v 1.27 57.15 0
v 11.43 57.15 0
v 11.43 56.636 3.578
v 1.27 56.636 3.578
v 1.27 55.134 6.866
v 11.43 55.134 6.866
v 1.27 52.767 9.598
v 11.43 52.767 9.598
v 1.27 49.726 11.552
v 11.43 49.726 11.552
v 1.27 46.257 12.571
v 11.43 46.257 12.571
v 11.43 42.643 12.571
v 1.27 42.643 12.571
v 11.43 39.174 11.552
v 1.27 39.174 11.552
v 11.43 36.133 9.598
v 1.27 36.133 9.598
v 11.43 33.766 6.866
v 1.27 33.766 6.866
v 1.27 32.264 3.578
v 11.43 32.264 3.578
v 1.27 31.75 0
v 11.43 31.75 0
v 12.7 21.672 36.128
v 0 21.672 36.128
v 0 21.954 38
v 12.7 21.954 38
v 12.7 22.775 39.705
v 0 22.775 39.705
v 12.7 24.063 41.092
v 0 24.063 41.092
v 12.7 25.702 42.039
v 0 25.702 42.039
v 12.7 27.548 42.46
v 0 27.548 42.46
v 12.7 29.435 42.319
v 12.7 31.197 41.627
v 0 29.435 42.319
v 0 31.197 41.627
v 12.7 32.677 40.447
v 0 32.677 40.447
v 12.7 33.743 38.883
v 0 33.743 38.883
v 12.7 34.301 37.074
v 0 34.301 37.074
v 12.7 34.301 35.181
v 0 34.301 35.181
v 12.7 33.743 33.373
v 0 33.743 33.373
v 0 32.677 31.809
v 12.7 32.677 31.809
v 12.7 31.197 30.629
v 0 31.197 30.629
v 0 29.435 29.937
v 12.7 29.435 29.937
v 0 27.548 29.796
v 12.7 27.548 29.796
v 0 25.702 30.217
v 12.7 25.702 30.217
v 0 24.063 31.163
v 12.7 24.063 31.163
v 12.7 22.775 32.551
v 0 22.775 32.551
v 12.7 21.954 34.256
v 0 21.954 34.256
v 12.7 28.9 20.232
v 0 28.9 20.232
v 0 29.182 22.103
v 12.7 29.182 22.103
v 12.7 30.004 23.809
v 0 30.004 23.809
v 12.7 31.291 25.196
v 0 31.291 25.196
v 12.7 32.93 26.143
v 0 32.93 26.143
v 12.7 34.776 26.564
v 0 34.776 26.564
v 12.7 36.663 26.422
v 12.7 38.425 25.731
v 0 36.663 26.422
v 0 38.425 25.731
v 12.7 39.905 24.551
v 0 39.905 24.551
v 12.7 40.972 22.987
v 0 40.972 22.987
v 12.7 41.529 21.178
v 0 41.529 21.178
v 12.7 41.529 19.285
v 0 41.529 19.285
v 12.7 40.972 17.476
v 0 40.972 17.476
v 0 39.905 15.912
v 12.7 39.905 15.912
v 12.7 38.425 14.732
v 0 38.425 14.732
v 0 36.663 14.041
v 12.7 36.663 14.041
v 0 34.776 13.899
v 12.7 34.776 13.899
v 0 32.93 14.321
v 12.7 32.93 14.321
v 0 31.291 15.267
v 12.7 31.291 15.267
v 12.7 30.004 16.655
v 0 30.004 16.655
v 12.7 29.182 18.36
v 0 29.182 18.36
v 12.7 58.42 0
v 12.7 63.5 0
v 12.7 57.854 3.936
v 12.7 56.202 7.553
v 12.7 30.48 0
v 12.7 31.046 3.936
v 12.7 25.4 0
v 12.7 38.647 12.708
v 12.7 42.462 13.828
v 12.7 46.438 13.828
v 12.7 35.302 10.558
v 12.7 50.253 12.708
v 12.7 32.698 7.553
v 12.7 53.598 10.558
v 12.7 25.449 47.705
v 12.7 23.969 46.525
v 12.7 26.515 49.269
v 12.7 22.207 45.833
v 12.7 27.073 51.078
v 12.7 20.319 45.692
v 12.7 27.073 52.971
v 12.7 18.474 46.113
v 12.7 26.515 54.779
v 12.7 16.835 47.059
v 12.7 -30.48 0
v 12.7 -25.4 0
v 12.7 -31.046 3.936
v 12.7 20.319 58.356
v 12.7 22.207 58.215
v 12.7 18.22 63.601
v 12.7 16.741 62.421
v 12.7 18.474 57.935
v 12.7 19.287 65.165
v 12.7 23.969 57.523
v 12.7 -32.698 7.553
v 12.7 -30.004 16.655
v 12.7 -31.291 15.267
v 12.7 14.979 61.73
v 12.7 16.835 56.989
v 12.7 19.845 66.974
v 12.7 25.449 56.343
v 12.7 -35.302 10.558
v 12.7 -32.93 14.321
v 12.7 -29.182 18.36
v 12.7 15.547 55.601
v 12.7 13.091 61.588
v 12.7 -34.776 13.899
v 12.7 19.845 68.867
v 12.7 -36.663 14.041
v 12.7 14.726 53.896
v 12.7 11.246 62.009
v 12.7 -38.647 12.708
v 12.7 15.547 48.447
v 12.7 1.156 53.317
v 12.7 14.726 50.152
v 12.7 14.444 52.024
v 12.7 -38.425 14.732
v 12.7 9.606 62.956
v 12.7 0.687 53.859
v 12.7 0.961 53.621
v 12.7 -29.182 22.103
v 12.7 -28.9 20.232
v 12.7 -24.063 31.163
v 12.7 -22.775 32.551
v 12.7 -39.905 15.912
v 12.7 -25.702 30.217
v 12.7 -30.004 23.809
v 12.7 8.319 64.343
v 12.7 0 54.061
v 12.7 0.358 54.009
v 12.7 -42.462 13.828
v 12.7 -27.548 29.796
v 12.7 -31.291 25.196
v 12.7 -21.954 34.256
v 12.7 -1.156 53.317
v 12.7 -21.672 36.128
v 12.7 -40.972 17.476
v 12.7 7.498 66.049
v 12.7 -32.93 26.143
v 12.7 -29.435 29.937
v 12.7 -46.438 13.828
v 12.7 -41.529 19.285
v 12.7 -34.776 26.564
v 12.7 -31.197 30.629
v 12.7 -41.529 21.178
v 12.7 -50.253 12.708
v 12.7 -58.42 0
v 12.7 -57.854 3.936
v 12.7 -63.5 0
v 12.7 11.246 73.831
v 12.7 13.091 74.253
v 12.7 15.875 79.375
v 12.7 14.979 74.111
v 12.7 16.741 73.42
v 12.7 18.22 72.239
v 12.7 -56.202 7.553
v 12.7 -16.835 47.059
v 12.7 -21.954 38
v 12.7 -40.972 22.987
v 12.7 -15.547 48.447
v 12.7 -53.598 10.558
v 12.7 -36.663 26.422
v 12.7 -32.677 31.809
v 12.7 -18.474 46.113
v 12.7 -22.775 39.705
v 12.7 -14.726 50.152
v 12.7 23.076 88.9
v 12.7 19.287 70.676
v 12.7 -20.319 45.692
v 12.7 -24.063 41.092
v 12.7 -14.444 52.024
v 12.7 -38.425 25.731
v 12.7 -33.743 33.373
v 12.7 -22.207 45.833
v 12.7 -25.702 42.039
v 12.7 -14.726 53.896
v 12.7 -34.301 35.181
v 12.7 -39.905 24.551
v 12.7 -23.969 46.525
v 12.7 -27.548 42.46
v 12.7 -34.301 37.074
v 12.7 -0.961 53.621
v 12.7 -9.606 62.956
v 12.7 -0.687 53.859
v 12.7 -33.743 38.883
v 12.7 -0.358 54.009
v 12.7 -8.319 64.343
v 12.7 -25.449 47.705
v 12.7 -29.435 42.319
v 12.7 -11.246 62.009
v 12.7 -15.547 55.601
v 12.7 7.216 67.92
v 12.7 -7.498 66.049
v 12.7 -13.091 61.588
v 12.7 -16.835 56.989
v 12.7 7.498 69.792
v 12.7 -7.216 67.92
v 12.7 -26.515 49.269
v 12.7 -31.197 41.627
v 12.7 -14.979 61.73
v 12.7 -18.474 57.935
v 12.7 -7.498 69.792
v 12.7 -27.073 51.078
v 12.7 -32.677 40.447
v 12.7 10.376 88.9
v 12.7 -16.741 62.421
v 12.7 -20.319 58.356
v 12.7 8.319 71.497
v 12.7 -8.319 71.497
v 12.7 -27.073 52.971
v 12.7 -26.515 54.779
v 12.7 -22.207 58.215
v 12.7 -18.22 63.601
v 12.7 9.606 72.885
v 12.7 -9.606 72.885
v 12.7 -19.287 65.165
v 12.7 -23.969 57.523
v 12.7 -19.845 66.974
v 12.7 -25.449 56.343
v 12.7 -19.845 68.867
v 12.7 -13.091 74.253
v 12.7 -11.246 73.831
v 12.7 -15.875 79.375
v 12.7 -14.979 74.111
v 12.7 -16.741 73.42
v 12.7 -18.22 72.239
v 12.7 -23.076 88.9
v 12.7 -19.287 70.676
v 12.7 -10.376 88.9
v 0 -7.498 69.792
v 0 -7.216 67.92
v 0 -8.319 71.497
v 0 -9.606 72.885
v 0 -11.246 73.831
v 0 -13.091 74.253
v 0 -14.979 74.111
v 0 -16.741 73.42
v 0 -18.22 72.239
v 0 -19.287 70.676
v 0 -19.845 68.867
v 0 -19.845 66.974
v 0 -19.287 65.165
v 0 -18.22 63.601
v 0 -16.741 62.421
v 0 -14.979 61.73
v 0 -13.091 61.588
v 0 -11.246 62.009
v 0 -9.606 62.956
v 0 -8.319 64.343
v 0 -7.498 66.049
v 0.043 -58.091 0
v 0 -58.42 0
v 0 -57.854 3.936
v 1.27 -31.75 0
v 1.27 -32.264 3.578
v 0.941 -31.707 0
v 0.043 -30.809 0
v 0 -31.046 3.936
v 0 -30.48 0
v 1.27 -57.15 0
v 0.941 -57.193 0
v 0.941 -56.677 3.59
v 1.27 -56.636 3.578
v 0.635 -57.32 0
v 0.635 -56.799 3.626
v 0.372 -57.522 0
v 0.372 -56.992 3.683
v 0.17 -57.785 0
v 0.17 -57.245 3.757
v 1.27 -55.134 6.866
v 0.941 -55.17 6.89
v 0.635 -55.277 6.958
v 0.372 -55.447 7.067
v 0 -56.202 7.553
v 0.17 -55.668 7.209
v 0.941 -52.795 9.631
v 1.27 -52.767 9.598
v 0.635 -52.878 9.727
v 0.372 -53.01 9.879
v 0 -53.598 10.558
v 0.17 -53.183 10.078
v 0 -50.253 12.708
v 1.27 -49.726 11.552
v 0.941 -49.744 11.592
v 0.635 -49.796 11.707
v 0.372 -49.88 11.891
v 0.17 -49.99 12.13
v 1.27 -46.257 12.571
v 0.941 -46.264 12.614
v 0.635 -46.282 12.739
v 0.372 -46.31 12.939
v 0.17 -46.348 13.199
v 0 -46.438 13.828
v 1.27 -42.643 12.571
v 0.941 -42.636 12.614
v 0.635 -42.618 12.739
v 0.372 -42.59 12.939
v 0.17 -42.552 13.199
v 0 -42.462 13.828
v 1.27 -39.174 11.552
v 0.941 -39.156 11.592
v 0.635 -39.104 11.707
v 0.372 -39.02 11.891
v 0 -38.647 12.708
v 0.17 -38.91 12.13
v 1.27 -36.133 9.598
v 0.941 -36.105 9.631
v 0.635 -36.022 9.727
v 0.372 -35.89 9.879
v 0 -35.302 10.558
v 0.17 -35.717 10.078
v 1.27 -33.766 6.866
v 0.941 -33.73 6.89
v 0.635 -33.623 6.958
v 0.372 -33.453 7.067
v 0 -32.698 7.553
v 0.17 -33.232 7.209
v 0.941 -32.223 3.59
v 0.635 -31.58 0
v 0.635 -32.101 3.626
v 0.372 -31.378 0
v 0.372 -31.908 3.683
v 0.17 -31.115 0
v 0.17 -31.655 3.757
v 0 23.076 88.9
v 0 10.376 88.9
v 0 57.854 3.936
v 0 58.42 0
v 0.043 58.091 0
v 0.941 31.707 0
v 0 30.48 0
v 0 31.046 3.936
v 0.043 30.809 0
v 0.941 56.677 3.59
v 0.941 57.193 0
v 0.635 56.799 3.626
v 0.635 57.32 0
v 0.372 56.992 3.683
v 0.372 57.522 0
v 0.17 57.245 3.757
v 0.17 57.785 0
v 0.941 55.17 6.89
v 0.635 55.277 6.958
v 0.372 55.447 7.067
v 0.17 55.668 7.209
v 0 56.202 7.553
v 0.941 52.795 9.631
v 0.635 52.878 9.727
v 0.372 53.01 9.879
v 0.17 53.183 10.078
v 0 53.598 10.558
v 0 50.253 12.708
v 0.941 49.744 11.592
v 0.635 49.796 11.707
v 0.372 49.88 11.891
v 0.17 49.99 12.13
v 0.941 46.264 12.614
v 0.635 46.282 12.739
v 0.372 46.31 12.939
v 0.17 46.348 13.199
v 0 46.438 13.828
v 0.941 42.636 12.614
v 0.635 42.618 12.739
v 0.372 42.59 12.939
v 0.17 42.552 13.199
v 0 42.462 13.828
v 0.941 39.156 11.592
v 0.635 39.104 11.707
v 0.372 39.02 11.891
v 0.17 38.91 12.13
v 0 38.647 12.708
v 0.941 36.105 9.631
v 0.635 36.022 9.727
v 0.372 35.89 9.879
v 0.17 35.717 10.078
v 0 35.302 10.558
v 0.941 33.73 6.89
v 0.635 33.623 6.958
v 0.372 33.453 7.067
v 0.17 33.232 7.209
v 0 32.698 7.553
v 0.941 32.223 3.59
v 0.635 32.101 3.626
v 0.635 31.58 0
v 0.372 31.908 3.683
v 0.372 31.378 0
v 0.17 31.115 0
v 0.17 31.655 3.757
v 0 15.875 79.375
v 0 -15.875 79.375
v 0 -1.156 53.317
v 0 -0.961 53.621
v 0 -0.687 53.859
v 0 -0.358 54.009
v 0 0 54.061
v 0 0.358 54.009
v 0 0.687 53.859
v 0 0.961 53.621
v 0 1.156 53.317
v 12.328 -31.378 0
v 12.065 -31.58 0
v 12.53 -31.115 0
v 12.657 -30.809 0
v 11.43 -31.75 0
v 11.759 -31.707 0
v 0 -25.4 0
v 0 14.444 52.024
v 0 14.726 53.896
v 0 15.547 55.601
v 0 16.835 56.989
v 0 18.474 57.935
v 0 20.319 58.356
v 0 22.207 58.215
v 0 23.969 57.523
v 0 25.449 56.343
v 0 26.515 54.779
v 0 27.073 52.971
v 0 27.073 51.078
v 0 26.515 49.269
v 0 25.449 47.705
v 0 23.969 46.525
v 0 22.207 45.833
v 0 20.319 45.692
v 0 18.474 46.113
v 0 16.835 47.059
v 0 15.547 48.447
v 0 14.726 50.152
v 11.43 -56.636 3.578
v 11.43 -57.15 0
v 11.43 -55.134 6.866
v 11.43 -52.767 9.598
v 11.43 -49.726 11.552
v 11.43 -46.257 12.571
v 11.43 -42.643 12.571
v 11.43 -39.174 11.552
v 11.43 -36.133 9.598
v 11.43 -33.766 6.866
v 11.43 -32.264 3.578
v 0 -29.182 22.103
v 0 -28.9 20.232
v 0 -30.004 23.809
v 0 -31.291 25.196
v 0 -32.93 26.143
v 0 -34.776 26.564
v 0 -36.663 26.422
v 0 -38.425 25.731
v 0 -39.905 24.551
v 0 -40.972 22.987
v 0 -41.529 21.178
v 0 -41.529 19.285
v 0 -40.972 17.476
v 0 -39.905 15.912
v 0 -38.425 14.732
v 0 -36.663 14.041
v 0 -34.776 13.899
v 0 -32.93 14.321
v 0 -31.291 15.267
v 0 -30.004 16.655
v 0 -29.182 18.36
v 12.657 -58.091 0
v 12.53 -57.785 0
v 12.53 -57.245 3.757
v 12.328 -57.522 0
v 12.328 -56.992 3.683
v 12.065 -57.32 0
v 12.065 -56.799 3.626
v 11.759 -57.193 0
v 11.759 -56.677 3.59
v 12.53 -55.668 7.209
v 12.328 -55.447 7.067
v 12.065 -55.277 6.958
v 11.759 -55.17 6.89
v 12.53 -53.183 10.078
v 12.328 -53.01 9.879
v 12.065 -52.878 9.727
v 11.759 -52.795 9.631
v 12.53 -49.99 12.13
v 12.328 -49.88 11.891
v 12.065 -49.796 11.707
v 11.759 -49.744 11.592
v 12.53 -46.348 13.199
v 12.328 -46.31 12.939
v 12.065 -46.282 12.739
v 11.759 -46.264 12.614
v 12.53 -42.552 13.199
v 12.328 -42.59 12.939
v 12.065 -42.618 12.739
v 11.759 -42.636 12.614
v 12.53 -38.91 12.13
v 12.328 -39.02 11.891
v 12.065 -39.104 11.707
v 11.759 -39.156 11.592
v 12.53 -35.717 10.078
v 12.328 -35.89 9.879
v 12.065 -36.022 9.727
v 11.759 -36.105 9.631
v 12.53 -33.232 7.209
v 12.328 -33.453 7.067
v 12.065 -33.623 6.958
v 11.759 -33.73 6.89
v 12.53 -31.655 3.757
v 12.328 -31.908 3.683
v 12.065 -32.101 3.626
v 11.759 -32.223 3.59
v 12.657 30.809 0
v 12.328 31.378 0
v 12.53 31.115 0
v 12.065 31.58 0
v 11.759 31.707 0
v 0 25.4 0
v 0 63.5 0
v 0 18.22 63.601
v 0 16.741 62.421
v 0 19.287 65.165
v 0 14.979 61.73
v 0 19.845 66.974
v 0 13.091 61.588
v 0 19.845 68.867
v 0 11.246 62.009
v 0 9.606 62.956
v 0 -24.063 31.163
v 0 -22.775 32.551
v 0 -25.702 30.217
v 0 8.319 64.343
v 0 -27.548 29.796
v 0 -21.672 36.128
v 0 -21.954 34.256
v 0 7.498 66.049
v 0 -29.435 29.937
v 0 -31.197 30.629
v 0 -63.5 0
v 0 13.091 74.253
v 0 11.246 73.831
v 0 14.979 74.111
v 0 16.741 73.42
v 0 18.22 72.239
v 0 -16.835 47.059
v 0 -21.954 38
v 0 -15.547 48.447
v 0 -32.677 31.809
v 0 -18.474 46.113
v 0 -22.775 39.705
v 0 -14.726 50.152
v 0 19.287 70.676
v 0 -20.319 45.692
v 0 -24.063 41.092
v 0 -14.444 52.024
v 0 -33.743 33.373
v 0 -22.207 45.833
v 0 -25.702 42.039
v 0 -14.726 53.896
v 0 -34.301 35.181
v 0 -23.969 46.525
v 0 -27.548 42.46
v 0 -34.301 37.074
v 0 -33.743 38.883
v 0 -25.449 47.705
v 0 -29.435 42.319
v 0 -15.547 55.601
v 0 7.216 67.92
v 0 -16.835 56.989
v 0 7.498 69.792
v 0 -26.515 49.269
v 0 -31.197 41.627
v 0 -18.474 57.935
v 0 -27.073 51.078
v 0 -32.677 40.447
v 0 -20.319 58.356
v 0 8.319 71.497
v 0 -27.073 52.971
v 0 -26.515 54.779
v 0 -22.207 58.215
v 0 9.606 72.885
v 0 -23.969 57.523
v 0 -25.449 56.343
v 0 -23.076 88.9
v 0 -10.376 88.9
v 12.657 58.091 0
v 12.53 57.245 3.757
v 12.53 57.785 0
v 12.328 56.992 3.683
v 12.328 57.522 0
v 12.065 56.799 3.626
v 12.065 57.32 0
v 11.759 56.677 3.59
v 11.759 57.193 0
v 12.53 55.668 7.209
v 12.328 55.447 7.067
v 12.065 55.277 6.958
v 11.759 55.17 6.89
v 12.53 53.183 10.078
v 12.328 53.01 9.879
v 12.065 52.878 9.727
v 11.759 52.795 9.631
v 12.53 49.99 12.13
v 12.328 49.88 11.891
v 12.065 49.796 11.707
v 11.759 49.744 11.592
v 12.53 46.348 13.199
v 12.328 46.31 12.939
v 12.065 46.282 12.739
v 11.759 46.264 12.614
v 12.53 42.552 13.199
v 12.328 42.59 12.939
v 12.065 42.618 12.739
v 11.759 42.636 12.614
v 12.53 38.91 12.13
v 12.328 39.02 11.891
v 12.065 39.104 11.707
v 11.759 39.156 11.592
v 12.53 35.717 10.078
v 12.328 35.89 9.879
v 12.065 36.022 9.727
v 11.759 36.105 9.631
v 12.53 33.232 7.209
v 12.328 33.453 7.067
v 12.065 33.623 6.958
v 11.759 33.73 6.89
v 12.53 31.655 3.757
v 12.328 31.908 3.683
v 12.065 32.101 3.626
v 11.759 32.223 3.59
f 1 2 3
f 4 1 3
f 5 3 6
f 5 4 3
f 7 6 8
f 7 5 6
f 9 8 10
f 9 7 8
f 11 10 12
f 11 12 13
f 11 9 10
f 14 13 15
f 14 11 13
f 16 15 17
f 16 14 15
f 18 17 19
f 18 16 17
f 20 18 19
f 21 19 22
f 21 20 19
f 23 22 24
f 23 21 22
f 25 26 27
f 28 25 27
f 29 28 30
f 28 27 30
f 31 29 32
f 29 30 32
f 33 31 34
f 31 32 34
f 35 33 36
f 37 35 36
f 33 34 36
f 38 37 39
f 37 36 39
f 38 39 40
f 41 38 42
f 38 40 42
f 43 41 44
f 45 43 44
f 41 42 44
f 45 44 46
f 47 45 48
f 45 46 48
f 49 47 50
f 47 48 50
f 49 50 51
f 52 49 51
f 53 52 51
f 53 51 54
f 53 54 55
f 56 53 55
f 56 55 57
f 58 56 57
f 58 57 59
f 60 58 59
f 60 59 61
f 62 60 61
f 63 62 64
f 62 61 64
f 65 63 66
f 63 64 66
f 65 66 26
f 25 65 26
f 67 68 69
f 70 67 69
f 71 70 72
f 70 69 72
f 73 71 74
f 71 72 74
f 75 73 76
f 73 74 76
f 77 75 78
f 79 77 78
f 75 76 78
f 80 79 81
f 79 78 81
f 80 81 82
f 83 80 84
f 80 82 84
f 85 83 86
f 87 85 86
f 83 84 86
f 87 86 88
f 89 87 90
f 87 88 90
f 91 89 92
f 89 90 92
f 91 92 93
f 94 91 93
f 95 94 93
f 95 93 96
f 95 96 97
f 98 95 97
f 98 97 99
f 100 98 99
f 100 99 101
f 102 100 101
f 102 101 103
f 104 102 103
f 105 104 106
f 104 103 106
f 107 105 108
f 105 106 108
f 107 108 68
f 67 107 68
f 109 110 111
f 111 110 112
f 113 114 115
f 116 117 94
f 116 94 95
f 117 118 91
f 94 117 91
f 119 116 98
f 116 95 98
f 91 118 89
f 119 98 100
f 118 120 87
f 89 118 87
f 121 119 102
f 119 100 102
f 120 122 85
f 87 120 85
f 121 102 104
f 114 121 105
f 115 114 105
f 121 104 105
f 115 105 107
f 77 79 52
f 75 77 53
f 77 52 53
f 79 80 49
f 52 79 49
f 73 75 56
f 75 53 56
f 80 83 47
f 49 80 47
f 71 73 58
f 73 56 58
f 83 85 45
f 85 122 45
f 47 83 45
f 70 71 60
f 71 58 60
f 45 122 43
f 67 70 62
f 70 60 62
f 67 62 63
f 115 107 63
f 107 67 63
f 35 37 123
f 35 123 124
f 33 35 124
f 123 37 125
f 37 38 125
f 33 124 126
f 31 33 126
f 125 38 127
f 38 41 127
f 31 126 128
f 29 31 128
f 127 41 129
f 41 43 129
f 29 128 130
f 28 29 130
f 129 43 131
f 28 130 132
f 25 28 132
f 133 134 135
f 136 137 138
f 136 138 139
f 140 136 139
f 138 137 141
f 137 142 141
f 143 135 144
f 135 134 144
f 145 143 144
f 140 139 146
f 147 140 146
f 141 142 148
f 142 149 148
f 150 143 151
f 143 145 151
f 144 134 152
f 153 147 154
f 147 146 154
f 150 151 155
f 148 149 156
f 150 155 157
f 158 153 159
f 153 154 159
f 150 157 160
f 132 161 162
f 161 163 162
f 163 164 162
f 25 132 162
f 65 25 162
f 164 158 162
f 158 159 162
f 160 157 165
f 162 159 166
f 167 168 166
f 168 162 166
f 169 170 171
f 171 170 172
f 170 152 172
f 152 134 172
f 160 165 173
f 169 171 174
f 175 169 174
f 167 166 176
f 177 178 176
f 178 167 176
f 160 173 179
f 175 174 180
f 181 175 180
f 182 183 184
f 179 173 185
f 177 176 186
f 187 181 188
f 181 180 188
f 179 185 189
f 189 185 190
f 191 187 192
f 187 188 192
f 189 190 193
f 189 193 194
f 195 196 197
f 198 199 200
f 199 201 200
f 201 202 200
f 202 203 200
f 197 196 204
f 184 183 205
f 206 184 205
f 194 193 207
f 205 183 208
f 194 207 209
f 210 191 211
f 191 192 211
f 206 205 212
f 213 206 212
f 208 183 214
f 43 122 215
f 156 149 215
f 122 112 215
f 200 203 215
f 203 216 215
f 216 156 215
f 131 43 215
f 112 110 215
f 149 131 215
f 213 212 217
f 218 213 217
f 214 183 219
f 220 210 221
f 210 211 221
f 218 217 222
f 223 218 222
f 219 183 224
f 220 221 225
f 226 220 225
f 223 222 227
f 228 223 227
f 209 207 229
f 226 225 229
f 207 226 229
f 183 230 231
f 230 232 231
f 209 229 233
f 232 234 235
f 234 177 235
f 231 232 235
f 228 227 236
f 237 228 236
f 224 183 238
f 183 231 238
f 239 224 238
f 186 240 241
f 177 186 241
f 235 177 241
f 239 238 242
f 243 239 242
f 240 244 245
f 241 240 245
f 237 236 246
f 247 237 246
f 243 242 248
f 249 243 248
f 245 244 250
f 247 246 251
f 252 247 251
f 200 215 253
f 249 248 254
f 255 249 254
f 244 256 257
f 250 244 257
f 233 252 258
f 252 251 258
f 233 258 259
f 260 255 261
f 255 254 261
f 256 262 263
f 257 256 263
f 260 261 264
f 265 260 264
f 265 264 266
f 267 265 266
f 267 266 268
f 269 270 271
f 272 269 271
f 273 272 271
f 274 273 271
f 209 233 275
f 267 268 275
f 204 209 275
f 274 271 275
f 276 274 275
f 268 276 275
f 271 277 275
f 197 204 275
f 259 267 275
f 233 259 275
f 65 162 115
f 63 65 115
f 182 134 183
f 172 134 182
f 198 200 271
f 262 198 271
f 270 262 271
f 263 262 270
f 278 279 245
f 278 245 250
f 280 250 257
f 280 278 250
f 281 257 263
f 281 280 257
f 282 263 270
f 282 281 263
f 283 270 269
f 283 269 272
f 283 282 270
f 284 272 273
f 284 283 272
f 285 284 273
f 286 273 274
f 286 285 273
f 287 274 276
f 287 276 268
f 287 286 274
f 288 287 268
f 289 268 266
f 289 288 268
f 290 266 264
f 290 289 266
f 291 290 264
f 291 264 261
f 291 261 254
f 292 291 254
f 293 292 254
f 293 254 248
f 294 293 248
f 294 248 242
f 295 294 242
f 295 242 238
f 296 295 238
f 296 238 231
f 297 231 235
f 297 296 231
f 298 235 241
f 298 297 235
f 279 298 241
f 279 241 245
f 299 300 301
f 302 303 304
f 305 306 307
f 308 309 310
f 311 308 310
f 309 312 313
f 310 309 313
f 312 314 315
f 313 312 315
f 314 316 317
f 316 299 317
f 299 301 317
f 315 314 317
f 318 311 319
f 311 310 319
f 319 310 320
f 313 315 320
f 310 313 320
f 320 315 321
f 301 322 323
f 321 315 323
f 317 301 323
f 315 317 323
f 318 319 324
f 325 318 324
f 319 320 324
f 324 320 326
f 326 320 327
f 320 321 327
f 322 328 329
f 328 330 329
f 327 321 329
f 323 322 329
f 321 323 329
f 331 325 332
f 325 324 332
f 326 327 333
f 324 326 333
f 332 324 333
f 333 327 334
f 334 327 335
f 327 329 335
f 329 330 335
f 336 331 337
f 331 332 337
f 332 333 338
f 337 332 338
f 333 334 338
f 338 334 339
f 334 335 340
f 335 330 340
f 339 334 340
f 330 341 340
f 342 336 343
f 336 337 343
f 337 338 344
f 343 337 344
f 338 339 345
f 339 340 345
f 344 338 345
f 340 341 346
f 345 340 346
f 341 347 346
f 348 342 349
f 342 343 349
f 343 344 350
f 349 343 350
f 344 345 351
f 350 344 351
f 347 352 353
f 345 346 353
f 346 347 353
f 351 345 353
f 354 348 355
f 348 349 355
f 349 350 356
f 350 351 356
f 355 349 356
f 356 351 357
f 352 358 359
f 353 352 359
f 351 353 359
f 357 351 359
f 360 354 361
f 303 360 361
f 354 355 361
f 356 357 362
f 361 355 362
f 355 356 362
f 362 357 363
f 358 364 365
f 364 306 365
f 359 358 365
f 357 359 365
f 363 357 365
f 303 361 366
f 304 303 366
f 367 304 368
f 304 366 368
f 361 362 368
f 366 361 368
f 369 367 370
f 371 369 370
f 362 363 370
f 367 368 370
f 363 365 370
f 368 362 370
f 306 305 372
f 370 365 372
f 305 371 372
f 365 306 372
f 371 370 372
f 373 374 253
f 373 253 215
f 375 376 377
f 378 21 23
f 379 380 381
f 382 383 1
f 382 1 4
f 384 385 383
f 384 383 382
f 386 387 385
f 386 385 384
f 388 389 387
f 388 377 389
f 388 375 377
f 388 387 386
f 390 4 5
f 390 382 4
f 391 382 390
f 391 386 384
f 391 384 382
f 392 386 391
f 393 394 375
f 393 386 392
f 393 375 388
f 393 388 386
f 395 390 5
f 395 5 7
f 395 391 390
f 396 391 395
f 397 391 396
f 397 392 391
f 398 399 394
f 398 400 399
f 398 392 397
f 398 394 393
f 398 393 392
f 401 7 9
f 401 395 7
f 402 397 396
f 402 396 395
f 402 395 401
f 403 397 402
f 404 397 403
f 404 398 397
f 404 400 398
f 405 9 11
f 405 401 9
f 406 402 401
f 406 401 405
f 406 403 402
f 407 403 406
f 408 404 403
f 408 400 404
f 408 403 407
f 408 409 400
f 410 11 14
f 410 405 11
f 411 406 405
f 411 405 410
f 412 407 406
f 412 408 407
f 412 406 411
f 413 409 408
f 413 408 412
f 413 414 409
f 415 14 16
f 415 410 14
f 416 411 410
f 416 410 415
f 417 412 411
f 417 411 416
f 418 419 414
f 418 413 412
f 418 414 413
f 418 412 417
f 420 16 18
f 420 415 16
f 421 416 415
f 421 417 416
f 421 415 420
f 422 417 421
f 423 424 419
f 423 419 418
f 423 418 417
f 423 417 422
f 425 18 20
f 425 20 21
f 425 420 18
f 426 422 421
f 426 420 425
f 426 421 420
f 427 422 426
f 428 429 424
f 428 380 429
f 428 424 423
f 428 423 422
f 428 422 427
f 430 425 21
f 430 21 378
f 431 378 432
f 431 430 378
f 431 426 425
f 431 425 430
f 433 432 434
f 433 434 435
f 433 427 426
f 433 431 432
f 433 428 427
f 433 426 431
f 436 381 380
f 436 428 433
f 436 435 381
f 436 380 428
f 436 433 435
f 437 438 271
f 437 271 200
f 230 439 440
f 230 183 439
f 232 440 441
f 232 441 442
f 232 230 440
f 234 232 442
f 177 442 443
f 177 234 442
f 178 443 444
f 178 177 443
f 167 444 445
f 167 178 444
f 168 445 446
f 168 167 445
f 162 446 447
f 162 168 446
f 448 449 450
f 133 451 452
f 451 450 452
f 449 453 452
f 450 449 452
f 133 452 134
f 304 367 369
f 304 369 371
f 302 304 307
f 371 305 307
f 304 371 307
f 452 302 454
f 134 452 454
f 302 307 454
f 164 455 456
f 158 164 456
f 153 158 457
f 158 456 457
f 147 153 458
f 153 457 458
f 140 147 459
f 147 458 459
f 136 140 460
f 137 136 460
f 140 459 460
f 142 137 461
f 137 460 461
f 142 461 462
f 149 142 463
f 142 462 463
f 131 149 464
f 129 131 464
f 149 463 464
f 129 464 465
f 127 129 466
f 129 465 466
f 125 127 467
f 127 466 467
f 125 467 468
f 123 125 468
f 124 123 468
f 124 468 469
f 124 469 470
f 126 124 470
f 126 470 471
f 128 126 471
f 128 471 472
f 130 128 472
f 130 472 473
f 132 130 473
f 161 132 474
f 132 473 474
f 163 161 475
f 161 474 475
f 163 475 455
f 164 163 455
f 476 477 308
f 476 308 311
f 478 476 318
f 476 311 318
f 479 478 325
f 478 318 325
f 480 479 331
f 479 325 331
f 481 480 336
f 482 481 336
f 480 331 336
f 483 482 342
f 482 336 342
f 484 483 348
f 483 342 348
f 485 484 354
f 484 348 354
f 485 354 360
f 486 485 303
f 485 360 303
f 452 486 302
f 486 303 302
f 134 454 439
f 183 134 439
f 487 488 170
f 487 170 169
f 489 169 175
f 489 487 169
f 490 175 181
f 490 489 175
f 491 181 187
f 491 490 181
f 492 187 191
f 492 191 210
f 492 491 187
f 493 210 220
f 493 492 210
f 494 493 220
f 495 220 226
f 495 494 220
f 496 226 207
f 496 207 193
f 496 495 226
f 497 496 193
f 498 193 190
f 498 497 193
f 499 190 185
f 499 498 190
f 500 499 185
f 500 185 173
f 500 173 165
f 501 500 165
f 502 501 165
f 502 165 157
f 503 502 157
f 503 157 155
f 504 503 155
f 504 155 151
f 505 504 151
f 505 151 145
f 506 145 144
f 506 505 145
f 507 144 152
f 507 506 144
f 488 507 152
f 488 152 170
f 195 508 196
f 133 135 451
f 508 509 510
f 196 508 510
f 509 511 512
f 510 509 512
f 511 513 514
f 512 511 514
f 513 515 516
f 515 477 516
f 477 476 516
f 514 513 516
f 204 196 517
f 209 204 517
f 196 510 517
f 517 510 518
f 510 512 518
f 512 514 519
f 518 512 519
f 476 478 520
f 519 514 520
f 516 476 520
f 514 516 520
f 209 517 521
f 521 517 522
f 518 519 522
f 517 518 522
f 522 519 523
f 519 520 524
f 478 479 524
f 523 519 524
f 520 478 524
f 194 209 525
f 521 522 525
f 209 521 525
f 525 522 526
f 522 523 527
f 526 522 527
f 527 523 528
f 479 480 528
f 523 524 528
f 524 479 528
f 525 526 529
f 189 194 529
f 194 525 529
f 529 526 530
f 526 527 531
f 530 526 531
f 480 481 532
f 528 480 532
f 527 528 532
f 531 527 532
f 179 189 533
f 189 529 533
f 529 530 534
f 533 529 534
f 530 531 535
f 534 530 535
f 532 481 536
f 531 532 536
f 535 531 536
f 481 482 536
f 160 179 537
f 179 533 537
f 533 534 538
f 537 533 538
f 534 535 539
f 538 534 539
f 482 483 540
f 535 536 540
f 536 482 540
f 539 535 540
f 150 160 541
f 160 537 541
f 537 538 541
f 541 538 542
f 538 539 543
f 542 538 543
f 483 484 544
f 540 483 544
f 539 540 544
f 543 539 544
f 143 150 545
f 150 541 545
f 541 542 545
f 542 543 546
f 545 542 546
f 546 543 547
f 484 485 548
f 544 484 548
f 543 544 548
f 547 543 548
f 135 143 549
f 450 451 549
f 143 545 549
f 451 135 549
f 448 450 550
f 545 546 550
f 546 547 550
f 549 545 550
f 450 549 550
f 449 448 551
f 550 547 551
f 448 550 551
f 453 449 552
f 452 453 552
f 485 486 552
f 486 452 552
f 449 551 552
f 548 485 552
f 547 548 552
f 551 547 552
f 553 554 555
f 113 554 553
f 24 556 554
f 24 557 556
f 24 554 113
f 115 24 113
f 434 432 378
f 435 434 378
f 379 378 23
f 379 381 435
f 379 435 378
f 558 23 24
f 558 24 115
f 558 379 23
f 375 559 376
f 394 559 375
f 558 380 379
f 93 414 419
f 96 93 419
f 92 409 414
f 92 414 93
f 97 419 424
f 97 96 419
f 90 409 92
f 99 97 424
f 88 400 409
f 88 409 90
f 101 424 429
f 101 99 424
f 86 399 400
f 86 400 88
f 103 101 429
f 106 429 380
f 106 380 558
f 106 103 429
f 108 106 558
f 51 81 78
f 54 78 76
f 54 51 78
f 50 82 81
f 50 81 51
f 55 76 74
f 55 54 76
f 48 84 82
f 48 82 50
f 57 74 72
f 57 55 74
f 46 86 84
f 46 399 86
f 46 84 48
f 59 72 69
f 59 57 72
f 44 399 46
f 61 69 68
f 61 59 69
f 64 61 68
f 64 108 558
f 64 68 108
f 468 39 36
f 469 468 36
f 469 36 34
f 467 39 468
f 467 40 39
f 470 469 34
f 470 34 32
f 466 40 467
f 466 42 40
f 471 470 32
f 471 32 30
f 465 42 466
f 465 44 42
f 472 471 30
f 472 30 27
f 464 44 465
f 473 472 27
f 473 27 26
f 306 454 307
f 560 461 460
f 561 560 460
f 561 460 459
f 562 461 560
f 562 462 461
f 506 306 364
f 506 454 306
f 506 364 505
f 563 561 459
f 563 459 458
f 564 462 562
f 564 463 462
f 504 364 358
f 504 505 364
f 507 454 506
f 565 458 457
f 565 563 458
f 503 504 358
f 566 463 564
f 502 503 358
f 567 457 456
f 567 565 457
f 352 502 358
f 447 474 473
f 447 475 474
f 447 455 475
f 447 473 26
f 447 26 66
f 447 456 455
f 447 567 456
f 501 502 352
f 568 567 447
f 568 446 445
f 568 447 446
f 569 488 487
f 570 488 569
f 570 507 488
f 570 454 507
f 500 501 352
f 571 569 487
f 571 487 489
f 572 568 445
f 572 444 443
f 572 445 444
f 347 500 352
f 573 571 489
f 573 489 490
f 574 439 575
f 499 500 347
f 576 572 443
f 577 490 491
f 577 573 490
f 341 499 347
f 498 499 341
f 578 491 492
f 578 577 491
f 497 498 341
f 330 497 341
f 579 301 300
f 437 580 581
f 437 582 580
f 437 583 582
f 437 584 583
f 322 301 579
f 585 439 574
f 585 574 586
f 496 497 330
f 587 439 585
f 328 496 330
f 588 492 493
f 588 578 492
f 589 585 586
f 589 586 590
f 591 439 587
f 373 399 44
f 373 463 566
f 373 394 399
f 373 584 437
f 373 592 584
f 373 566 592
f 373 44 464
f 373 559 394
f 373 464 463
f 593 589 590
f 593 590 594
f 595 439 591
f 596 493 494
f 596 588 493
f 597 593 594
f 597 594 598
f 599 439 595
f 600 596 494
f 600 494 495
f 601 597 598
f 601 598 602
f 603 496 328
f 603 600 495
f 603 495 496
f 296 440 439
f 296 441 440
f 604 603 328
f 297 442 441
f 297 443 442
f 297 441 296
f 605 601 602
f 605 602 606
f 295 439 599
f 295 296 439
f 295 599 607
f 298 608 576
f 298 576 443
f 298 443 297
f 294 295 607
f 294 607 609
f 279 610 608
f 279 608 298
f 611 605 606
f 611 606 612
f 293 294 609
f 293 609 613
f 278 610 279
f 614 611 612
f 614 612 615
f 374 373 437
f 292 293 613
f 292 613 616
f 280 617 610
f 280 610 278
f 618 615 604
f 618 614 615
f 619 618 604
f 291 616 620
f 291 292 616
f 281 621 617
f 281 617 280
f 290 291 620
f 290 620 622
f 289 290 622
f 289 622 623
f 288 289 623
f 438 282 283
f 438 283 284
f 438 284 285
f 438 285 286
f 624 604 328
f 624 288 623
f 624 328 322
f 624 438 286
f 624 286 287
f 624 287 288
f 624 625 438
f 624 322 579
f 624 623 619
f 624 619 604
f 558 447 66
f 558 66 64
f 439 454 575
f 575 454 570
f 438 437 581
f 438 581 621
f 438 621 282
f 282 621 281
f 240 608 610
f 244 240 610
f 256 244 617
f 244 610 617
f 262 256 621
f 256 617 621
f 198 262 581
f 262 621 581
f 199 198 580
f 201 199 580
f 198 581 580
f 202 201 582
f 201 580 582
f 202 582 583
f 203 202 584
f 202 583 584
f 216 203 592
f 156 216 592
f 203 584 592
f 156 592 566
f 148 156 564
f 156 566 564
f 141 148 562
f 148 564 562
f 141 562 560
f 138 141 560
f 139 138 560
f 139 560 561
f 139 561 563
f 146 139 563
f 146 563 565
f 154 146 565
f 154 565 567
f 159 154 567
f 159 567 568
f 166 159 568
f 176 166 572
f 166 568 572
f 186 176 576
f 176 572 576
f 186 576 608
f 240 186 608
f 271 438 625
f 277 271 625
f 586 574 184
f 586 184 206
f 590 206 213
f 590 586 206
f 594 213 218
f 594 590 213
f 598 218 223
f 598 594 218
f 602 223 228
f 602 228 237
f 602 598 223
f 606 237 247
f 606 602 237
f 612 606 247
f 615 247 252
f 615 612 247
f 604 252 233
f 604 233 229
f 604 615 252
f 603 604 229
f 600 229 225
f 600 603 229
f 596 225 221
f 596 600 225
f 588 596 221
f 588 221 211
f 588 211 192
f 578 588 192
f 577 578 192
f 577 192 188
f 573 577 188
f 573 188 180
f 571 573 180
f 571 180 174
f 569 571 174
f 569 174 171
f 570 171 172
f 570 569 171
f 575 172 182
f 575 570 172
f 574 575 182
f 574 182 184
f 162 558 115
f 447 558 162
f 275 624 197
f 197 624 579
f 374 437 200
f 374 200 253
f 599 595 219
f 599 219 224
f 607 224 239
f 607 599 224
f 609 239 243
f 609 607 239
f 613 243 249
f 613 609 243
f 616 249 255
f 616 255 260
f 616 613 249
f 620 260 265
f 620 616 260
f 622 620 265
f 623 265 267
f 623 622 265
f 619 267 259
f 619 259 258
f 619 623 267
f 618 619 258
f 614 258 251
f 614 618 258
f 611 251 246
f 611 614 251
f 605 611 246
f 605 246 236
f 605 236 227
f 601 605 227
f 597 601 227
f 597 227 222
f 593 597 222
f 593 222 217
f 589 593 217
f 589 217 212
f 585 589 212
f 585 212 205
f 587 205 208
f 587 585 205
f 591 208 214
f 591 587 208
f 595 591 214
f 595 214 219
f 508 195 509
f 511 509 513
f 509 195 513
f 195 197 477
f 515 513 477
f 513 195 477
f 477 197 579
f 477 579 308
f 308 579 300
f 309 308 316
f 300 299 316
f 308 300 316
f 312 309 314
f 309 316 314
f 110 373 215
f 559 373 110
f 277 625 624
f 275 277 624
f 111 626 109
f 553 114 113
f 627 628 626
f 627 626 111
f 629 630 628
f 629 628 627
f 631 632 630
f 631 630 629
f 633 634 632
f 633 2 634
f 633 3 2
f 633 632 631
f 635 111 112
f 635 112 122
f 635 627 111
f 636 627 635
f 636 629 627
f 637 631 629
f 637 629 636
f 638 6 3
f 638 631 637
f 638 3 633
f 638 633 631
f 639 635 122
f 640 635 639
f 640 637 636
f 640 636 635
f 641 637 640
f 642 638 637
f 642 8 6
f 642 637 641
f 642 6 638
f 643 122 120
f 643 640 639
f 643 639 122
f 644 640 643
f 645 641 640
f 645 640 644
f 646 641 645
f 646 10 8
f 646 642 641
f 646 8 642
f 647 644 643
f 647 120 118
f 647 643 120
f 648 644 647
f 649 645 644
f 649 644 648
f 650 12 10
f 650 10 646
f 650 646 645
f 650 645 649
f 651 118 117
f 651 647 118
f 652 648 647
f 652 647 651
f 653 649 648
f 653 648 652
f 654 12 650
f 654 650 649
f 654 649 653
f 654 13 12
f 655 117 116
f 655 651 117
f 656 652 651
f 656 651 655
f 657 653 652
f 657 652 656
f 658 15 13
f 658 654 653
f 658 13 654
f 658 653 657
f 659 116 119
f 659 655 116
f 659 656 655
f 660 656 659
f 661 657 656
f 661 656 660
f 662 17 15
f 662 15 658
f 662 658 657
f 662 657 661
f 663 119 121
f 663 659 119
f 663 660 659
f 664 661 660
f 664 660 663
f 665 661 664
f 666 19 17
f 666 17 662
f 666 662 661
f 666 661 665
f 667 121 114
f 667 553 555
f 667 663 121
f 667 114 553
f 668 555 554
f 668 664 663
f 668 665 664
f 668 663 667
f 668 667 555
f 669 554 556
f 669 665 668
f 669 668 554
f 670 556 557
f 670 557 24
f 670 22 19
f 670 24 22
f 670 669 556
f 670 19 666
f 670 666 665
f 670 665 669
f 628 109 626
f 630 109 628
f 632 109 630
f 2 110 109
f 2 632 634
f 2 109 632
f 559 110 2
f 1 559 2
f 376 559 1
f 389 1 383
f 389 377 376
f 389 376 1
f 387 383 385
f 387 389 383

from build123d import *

# Parameters (mm, degrees)
F0_R     = 6.35
F1_DEPTH = 12.7
F3_R     = 1.27


with BuildPart() as f1:
    # F0 (on Right) → F1 (new body)
    with BuildSketch(Plane.YZ):
        with BuildLine():
            Line((-23.075738686, 88.9), (-63.5, 0))
            Line((-63.5, 0), (-57.15, 0))
            ThreePointArc((-57.15, 0), (-44.45, 12.7), (-31.75, 0))
            Line((-31.75, 0), (-25.4, 0))
            Line((-25.4, 0), (0, 55.85902937))
            Line((0, 55.85902937), (0, 79.375))
            Line((0, 79.375), (-15.875, 79.375))
            Line((-15.875, 79.375), (-10.375738686, 88.9))
            Line((-10.375738686, 88.9), (-23.075738686, 88.9))
        make_face()
        with Locations((-35.2503683902, 20.2315941844)):
            Circle(F0_R, mode=Mode.SUBTRACT)
        with Locations((-28.0220864111, 36.1278467579)):
            Circle(F0_R, mode=Mode.SUBTRACT)
        with Locations((-20.7938044319, 52.0240993314)):
            Circle(F0_R, mode=Mode.SUBTRACT)
        with Locations((-13.5655224528, 67.9203519049)):
            Circle(F0_R, mode=Mode.SUBTRACT)
    extrude(amount=F1_DEPTH)

    # F2: F1 across plane


with BuildPart() as f1_1:
    add(f1.part)
    add(f1.part.mirror(Plane.XZ))

    # F3
    f3_edges = [f1_1.edges().sort_by_distance(p)[0] for p in [
        (12.7, 44.45, 12.7),
        (0, 44.45, 12.7),
        (0, -44.45, 12.7),
        (12.7, -44.45, 12.7),
        (6.35, 0, 55.859029),
    ]]
    fillet(f3_edges, radius=F3_R)


solid = f1_1.part
